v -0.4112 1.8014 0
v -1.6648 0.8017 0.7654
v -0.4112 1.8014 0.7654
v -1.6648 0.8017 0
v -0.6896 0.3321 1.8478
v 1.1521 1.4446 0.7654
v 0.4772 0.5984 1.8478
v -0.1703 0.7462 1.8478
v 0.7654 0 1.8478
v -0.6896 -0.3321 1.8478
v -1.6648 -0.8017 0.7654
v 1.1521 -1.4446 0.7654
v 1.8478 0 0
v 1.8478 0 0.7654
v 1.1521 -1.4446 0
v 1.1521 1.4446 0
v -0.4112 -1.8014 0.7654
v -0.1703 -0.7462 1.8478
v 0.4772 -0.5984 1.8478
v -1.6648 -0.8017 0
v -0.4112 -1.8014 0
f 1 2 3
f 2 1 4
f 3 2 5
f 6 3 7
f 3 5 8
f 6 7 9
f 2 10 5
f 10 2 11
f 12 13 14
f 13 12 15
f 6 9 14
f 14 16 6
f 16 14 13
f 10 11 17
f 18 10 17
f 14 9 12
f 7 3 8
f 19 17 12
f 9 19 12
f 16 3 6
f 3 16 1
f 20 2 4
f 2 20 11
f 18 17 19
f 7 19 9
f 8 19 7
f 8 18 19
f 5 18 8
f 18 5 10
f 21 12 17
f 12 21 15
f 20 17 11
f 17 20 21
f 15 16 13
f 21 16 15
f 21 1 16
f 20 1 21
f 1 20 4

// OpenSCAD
// Generated by generate_scads.py
intersection() {
  cylinder(h=5, r=12, center=false);
  sphere(r=4);
  intersection() {
    sphere(r=2);
    sphere(r=2);
  }
  union() {
    cube(size=[15,25,5], center=false);
    sphere(r=12);
    sphere(r=6);
  }
}
